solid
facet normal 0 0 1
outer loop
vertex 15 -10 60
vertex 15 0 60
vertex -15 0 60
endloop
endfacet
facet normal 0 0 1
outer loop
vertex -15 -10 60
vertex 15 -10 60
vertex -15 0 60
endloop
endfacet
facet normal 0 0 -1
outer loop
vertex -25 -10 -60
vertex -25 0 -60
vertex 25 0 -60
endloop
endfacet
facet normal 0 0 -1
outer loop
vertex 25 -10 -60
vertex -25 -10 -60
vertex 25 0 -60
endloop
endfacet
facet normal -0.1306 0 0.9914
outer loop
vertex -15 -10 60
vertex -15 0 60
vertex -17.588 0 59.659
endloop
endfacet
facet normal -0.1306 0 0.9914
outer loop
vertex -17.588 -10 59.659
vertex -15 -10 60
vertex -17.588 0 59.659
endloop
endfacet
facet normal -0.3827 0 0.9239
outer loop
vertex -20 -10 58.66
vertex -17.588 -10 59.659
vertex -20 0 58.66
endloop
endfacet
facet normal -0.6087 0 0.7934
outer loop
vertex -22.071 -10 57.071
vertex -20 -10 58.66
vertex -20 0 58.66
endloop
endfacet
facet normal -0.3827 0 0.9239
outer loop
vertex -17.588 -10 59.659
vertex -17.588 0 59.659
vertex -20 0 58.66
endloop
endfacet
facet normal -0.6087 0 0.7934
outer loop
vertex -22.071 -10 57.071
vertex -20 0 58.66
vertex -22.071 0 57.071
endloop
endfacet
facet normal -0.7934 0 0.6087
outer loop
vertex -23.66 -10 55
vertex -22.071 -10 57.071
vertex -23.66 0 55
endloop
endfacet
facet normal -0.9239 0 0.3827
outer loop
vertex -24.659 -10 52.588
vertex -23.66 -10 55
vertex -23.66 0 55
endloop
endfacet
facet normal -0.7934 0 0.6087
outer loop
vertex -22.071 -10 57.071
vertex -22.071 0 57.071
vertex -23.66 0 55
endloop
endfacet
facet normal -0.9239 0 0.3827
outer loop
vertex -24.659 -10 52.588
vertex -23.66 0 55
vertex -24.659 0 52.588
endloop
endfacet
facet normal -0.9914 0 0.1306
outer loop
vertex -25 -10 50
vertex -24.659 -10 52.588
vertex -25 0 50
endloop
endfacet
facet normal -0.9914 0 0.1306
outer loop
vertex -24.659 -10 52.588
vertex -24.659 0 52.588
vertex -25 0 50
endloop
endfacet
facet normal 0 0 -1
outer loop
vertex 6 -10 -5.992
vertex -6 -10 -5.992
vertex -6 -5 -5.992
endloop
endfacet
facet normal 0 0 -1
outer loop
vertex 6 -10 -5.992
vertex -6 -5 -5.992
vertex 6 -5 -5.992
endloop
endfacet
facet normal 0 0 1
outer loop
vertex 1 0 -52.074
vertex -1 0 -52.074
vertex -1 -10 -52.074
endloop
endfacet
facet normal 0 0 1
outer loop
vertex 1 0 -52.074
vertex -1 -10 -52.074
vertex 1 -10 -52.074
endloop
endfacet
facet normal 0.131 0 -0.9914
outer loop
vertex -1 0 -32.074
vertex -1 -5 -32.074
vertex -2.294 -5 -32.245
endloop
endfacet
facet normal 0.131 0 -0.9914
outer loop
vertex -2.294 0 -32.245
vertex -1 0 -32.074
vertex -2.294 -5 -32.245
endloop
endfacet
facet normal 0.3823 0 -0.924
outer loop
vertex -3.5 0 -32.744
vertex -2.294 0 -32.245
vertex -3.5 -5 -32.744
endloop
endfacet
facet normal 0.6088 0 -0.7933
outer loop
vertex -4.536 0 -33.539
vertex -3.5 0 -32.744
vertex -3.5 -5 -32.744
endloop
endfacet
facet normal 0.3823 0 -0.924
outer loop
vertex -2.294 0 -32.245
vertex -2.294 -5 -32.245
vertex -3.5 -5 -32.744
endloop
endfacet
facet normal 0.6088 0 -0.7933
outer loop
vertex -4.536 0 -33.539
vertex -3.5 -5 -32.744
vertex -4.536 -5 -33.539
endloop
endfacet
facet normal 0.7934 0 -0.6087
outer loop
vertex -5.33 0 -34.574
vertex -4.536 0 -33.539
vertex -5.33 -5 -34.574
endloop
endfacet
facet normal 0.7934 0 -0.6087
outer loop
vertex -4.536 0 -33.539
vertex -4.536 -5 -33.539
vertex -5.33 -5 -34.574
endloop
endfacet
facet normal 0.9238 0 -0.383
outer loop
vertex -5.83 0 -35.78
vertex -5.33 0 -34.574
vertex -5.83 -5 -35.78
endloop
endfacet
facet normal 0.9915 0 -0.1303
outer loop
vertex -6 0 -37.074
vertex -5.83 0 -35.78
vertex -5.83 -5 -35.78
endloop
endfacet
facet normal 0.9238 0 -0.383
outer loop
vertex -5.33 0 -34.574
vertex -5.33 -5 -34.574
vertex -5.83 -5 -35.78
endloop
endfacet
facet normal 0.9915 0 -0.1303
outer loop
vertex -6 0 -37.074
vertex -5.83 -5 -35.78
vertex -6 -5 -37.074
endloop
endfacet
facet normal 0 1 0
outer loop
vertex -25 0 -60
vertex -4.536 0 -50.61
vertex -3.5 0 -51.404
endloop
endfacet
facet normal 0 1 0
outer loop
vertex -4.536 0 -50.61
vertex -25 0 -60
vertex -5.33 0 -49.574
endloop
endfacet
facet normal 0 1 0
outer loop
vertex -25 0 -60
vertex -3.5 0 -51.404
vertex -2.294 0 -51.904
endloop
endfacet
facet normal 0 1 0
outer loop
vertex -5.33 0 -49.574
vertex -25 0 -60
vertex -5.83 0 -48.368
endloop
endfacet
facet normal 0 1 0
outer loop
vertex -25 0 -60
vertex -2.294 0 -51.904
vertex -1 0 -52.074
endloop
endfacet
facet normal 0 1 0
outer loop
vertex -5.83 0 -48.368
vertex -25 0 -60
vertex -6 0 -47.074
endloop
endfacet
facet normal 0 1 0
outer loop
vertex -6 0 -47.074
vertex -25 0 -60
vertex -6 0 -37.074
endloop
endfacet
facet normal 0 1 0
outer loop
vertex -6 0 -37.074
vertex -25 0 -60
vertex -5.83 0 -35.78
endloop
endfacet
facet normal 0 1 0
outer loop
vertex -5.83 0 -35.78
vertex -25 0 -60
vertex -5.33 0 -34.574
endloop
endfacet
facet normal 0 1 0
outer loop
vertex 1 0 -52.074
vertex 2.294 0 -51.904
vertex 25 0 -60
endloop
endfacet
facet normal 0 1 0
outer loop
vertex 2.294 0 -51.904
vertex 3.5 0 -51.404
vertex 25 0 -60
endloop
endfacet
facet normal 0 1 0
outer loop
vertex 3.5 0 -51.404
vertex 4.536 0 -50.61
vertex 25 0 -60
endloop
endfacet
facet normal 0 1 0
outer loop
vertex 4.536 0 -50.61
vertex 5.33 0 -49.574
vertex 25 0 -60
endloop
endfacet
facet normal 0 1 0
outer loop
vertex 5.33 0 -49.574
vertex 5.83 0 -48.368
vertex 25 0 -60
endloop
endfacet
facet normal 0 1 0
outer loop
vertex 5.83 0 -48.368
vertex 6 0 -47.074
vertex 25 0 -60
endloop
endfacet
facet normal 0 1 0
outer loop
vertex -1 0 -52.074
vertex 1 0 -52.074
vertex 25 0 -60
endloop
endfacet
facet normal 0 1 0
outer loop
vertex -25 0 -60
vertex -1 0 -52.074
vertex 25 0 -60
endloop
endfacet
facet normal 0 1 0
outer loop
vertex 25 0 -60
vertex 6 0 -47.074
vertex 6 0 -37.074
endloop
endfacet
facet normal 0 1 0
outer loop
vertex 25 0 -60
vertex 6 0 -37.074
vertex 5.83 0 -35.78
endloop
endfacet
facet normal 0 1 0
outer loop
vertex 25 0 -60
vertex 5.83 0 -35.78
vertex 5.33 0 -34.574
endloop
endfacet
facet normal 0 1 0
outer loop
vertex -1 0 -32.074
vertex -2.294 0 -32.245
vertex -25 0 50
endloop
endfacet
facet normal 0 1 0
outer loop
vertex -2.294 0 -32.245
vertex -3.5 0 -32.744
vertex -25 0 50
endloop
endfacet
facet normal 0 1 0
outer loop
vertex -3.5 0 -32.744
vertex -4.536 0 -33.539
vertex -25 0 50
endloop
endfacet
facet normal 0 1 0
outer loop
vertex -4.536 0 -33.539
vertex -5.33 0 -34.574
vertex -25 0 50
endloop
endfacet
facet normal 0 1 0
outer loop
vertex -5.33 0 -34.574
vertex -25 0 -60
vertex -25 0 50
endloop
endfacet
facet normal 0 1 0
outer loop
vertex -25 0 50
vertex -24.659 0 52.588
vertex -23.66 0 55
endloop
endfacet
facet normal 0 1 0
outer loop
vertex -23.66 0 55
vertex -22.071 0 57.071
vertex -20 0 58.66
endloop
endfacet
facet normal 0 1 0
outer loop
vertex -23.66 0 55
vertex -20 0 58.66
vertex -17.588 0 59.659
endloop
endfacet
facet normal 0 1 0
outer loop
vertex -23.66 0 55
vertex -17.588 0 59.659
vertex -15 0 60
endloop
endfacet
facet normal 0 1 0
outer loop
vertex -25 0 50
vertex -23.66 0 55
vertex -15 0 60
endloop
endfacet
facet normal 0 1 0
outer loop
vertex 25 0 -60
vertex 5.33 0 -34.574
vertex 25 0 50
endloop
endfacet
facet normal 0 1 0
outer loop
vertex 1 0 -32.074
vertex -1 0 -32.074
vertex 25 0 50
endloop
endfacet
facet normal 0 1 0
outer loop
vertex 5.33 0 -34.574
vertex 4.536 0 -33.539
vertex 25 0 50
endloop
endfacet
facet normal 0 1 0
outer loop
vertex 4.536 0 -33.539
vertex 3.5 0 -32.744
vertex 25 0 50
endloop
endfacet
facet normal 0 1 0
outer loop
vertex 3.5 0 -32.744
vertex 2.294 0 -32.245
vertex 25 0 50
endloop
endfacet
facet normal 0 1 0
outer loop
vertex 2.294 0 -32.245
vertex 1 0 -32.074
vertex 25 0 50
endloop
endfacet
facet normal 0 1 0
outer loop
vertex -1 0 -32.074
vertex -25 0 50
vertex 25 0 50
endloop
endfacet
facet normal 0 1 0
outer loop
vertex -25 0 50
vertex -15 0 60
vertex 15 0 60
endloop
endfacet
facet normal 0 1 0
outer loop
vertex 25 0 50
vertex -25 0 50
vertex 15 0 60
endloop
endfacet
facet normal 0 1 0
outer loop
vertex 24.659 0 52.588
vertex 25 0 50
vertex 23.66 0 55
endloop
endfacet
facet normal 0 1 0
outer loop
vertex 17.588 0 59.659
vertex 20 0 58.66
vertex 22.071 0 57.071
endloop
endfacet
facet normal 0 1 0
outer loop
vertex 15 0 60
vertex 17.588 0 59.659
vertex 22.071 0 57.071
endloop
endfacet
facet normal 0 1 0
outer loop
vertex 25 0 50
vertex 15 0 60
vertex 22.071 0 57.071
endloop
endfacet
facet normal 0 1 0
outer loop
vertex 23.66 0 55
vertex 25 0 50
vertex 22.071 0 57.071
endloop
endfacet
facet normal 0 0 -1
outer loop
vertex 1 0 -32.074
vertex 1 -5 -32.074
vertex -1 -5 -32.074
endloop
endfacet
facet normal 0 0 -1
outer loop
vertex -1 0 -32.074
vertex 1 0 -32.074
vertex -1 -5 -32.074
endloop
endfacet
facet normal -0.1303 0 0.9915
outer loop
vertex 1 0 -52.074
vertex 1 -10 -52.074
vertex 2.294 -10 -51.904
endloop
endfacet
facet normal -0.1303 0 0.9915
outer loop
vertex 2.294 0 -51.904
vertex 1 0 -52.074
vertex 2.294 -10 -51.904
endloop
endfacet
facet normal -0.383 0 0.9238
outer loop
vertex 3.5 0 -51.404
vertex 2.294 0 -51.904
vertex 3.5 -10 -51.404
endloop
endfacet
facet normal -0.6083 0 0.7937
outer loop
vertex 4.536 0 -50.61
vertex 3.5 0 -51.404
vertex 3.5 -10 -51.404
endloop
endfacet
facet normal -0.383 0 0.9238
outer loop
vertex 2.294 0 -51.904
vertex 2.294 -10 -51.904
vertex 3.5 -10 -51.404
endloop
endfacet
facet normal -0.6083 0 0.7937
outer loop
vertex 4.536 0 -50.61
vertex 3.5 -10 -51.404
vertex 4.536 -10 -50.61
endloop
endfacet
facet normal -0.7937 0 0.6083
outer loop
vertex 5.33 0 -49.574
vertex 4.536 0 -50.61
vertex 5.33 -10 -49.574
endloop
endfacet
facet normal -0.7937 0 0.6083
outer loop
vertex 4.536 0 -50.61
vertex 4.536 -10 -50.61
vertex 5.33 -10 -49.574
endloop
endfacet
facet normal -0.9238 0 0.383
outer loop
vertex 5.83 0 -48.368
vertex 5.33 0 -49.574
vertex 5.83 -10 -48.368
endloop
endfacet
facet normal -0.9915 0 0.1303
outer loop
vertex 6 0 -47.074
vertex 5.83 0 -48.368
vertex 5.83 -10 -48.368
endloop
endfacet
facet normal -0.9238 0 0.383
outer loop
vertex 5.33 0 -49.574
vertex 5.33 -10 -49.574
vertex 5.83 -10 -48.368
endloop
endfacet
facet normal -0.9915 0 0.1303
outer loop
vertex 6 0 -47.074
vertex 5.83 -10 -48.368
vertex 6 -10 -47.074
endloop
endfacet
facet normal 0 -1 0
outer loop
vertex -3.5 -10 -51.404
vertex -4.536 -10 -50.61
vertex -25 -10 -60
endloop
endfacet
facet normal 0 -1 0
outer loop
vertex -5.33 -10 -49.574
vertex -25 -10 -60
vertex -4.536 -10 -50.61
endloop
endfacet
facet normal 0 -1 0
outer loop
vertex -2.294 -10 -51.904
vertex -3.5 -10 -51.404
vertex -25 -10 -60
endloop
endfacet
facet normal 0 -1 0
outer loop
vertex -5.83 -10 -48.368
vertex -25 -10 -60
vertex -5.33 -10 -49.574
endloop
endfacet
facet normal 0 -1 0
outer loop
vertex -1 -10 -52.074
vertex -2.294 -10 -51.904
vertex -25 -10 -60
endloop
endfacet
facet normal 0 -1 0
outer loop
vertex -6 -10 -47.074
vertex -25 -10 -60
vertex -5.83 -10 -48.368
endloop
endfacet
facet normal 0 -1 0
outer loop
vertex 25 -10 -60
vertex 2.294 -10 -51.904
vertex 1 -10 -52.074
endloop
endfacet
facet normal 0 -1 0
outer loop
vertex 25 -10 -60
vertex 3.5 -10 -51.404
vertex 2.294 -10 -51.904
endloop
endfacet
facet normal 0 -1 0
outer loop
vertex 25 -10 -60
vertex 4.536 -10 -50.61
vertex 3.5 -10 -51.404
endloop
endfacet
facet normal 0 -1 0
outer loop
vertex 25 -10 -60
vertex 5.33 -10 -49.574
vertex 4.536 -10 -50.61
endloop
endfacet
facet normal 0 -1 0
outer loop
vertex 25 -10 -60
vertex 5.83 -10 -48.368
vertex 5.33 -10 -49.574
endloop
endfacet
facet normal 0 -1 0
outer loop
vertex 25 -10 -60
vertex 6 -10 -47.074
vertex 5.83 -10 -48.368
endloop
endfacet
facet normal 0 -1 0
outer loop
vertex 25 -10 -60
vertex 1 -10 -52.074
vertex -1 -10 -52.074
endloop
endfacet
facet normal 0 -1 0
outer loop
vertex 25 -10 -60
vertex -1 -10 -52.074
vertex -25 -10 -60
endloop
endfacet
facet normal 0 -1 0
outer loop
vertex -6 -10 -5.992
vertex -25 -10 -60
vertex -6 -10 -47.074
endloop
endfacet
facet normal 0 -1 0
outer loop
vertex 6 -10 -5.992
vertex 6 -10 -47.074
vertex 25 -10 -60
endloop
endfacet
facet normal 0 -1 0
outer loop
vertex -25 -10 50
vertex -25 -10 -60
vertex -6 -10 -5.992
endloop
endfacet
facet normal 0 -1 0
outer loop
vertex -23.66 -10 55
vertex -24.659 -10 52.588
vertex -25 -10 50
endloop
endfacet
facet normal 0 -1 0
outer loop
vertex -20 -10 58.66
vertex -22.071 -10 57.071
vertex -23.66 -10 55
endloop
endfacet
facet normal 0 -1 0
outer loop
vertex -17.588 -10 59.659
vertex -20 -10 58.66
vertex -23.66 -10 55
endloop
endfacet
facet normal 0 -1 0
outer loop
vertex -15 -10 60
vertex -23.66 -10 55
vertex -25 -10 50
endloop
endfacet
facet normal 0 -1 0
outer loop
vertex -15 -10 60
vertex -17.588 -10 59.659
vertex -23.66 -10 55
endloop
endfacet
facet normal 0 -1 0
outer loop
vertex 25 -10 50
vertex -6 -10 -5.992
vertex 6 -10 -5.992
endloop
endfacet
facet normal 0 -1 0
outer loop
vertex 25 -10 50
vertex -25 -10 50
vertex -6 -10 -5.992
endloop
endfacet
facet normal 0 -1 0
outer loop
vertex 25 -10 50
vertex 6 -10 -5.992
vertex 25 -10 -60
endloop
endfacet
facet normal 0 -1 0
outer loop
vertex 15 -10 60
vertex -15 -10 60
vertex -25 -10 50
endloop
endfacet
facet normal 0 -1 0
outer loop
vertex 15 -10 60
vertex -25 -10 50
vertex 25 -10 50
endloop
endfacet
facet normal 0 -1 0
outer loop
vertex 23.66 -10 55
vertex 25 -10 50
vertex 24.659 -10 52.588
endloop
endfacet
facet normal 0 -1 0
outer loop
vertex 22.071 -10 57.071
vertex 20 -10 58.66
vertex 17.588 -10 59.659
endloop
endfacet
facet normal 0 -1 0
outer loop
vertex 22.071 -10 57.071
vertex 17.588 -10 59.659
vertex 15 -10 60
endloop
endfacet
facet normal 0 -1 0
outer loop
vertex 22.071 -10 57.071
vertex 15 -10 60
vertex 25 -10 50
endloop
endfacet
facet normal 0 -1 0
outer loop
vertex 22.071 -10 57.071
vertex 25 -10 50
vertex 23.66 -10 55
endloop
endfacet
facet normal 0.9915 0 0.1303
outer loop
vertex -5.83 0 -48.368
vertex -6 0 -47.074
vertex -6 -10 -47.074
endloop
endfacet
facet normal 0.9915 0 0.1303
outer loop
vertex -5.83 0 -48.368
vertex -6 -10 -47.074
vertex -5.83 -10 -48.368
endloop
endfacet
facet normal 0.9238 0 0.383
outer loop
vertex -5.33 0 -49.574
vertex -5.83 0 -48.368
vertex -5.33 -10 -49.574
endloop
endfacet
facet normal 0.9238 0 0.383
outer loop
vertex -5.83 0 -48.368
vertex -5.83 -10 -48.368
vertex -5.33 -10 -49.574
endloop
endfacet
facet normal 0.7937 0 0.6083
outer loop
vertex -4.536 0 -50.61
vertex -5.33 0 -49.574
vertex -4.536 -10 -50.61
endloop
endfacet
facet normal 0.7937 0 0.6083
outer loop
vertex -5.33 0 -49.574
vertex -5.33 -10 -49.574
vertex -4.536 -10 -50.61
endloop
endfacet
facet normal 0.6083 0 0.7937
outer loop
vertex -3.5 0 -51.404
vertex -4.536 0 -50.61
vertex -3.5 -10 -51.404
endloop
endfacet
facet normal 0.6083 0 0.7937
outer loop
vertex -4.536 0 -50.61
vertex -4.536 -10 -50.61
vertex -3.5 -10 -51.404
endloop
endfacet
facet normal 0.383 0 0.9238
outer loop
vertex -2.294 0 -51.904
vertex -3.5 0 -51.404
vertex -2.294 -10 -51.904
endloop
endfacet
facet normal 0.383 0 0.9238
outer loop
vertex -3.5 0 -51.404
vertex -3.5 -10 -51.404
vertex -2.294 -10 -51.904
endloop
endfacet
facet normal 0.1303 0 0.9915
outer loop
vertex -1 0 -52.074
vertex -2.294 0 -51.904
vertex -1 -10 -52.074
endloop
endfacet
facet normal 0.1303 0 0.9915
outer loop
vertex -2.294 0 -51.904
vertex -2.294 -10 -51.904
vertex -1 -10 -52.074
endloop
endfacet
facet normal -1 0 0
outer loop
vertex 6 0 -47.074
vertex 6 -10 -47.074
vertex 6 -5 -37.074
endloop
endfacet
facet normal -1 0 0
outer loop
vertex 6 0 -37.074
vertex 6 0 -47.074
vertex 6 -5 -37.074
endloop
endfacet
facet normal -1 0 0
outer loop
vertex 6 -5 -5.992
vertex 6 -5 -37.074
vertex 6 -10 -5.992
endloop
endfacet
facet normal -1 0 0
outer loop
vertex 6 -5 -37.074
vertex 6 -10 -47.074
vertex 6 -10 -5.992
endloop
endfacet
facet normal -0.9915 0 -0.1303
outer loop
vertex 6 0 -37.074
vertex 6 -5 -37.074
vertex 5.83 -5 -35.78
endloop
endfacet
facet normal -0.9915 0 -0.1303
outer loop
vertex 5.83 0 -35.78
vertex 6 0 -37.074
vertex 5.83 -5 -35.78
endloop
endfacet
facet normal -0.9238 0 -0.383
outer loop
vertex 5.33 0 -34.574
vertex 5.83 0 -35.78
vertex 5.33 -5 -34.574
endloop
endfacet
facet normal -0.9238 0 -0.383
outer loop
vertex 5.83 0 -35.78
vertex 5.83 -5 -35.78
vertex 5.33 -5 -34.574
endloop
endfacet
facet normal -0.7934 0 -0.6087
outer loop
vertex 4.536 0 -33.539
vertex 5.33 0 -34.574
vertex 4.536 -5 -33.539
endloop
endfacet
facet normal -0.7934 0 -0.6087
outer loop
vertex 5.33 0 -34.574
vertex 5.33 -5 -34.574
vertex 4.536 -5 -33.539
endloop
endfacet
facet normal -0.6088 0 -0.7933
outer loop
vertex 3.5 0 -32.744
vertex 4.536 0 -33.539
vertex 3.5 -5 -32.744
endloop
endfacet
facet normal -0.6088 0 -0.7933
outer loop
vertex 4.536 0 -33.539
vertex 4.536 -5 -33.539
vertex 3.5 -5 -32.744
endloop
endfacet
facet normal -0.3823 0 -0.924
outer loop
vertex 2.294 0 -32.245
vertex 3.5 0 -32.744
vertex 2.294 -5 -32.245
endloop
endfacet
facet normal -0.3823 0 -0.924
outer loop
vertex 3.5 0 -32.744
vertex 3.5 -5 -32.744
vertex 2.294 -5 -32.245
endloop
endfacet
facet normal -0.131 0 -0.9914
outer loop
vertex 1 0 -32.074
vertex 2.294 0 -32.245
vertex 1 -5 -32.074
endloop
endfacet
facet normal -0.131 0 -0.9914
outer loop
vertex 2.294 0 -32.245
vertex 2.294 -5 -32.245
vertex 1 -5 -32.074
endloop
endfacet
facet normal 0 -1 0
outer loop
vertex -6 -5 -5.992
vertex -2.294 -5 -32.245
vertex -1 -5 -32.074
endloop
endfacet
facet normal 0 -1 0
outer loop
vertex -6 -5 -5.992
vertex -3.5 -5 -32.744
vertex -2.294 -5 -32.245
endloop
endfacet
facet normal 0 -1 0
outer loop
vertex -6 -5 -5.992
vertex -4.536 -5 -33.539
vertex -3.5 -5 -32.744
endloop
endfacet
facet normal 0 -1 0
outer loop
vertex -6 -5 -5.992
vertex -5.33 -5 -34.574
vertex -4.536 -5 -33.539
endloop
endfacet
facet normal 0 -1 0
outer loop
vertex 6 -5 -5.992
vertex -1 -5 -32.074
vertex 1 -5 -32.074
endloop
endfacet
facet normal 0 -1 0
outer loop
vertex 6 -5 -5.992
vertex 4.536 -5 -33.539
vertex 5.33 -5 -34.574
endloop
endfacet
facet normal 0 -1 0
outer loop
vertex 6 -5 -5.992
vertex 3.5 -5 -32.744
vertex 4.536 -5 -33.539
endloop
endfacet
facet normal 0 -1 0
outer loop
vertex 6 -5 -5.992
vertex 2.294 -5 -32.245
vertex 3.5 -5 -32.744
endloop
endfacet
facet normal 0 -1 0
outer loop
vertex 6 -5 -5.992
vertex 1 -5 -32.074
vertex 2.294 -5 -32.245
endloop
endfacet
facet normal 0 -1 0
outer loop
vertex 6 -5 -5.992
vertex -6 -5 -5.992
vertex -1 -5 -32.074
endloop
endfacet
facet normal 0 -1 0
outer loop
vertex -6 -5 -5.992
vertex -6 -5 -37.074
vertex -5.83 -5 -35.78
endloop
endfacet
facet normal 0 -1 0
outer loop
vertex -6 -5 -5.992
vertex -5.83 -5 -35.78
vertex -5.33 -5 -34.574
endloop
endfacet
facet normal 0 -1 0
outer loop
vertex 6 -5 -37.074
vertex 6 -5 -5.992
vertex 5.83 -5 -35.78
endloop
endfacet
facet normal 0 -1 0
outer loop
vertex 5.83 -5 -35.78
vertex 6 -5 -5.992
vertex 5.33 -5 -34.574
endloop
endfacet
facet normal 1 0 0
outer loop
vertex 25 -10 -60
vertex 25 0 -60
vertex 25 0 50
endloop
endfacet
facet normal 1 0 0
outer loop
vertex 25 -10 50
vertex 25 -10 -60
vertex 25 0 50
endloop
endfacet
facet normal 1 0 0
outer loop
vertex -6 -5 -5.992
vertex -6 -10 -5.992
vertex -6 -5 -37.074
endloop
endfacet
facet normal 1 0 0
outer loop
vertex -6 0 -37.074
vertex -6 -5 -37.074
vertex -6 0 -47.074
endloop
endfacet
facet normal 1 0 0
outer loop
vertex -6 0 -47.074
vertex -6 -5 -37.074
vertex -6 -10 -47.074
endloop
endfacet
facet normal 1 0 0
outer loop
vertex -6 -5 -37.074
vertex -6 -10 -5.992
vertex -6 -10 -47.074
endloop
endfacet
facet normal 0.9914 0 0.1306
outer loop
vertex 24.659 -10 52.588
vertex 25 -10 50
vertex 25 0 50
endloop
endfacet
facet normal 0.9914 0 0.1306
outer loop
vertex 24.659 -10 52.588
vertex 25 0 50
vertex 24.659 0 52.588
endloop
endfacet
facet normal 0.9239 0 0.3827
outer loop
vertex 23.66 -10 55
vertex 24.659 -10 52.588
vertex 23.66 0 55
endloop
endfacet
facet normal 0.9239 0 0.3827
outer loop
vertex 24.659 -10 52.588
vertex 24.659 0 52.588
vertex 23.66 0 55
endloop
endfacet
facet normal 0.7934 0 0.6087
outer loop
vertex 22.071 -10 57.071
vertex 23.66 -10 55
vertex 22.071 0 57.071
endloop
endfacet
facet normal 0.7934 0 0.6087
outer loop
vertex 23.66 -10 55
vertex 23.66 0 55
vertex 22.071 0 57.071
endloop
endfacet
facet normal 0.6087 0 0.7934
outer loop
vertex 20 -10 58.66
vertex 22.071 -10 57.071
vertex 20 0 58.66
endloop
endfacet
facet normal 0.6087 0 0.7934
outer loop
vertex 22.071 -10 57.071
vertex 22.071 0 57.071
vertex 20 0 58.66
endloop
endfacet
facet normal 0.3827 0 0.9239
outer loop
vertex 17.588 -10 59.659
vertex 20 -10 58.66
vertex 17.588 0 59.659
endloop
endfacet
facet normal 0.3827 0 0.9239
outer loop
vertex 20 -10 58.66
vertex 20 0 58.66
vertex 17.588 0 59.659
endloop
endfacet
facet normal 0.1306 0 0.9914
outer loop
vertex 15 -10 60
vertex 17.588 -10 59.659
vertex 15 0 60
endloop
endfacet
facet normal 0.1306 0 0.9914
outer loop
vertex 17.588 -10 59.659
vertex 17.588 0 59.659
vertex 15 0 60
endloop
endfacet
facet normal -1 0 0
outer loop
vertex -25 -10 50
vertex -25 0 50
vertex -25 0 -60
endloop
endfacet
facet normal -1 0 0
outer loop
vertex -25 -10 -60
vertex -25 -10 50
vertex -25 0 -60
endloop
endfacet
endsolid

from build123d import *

# Parameters (mm, degrees)
F1_DEPTH = 10
F3_DEPTH = 11
F4_W     = 12
F4_H     = 33.18387
F5_DEPTH = 5


with BuildPart() as f1:
    # F0 (on Front) → F1 (new body)
    with BuildSketch(Plane.XZ):
        with BuildLine():
            ThreePointArc((25, 50), (22.071068, 57.071068), (15, 60))
            Line((15, 60), (-15, 60))
            ThreePointArc((-15, 60), (-22.071068, 57.071068), (-25, 50))
            Line((-25, 50), (-25, -60))
            Line((-25, -60), (25, -60))
            Line((25, -60), (25, 50))
        make_face()
    extrude(amount=F1_DEPTH)

    # F2 (on face) → F3 (cut)
    with BuildSketch(Plane.XZ.offset(10)):
        with BuildLine():
            Line((1, -32.074185), (-1, -32.074185))
            ThreePointArc((-1, -32.074185), (-4.535534, -33.538651), (-6, -37.074185))
            Line((-6, -37.074185), (-6, -47.074185))
            ThreePointArc((-6, -47.074185), (-4.535534, -50.609719), (-1, -52.074185))
            Line((-1, -52.074185), (1, -52.074185))
            ThreePointArc((1, -52.074185), (4.535534, -50.609719), (6, -47.074185))
            Line((6, -47.074185), (6, -37.074185))
            ThreePointArc((6, -37.074185), (4.535534, -33.538651), (1, -32.074185))
        make_face()
    extrude(amount=-F3_DEPTH, mode=Mode.SUBTRACT)

    # F4 (on face) → F5 (cut)
    with BuildSketch(Plane.XZ.offset(10)):
        with Locations((0, -22.583467)):
            Rectangle(F4_W, F4_H)
    extrude(amount=-F5_DEPTH, mode=Mode.SUBTRACT)


solid = f1.part
